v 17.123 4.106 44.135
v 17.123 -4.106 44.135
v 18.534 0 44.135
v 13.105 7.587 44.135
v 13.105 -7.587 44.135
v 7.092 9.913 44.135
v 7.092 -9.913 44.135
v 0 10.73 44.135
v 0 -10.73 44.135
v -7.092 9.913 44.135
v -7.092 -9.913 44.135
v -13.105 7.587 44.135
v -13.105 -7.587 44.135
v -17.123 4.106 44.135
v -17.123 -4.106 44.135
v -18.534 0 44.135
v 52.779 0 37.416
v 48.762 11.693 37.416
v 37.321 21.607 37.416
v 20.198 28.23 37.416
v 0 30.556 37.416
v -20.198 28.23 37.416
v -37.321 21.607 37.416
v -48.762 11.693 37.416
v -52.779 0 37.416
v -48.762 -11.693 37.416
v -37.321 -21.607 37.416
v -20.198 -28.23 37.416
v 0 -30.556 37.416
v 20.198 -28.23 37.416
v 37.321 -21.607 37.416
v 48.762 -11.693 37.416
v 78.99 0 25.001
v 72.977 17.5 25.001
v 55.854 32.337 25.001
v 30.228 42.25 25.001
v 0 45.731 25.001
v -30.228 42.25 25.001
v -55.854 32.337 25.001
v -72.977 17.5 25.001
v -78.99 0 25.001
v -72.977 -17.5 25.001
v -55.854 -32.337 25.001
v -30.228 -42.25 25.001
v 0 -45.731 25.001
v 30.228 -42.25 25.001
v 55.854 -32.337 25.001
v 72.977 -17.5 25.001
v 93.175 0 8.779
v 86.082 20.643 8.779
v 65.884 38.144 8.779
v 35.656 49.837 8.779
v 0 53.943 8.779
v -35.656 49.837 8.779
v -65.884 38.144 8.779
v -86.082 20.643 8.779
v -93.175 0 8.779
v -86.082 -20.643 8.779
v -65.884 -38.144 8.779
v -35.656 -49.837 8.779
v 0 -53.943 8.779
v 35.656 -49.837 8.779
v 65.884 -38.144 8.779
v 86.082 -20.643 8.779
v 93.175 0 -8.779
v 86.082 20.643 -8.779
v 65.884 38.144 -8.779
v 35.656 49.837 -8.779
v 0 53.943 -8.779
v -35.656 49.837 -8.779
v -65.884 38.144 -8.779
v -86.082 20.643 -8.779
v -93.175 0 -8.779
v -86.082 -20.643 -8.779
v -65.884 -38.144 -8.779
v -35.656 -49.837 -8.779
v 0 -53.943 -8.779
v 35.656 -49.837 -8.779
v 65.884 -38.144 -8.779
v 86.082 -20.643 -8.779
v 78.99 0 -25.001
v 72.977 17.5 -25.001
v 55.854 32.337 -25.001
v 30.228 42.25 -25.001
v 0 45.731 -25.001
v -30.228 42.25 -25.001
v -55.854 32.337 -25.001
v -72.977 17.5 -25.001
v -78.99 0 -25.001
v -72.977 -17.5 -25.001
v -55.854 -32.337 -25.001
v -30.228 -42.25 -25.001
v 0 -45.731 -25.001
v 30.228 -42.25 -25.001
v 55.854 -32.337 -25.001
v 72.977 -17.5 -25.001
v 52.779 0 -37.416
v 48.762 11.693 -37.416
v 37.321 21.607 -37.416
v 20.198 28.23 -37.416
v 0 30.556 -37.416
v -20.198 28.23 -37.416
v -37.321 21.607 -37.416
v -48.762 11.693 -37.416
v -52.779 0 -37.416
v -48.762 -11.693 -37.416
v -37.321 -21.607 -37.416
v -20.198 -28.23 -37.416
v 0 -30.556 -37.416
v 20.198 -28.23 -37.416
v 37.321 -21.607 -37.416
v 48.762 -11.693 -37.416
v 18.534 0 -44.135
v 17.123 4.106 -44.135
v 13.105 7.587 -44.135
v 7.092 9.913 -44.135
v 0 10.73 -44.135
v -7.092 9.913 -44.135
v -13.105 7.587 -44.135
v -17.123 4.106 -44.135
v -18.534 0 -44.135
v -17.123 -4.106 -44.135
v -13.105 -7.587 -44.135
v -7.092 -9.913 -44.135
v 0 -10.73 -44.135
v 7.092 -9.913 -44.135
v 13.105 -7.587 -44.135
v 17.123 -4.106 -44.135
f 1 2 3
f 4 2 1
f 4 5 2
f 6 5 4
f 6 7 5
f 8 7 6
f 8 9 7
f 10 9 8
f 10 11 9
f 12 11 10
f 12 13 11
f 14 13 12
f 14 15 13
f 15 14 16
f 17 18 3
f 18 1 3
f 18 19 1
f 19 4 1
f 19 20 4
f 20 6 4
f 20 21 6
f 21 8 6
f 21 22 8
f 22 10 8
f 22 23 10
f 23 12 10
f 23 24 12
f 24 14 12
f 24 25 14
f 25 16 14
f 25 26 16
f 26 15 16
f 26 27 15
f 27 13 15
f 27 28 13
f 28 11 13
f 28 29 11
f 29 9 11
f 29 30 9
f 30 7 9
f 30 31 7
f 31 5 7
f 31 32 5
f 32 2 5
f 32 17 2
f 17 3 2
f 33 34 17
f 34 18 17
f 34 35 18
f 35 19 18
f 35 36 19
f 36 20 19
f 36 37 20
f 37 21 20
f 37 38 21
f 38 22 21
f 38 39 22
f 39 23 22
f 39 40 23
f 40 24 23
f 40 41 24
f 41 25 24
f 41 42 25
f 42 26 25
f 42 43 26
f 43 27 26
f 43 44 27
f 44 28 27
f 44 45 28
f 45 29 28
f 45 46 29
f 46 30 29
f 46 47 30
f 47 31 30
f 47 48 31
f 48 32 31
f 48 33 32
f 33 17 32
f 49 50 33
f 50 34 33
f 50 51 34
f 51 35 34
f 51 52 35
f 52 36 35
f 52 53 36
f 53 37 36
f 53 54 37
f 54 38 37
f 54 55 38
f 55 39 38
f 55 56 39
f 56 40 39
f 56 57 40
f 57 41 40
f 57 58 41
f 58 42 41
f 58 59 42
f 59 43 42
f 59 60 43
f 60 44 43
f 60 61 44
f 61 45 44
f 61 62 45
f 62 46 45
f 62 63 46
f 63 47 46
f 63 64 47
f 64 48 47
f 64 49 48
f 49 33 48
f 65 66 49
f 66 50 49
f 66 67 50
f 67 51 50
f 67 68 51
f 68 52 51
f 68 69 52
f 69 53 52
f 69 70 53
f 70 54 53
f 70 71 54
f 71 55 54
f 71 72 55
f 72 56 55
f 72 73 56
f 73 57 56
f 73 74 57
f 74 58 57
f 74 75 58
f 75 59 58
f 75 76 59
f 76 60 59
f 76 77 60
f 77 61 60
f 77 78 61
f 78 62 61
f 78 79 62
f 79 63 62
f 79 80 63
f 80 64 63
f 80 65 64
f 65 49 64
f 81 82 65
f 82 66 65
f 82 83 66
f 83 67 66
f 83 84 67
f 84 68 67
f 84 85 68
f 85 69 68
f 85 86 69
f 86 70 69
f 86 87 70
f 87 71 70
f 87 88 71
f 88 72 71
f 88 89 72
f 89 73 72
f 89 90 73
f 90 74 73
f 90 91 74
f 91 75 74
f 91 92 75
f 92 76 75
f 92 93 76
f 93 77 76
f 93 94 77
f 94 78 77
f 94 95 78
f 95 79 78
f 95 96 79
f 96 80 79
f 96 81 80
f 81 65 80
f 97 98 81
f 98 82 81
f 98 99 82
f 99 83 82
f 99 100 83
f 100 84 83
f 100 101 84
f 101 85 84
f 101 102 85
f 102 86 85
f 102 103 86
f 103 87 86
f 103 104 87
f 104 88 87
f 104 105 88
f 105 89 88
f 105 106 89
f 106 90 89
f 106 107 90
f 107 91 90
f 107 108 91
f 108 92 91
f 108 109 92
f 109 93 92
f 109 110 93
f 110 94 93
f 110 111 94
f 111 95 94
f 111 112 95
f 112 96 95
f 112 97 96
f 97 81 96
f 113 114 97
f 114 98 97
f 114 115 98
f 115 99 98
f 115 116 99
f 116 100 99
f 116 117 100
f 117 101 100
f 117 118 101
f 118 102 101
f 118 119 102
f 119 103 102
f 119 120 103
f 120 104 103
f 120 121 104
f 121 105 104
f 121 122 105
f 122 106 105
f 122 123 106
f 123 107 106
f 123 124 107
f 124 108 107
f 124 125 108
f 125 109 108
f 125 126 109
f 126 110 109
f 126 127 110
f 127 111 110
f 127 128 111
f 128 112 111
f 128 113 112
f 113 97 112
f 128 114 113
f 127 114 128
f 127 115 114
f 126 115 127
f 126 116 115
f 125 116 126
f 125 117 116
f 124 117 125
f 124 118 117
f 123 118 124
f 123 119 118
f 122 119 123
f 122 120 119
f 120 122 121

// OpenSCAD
// Generated by SolidPython 1.0.1 on 2020-07-29 00:46:54


scale(v = [19, 11, 9]) {
	sphere(r = 5);
}
/***********************************************
*********      SolidPython code:      **********
************************************************
 
# import packages: SolidPython
from solid import *
from solid.utils import *
from itertools import chain, combinations, permutations


class Resize:

    def __init__(self, scad_file):
        self.scad_file = scad_file
        #self.scad_file = import_scad(scad_file)
        # cone/cylinder param:
        self.r1 = 0
        self.r2 = 0
        self.h = 0
        # rectangular prism param:
        self.w = 0
        self.l = 0
        # ellipse param:
        self.r = 0

    # import OpenScad code (file name corresponds to shape)


    # classify shape + parameters
    def assign(self, param1, param2, param3):
        if self.scad_file == 'cone.scad':
            self.r1 = param1
            self.r2 = param2
            self.h = param3
        elif self.scad_file == 'cylinder.scad':
            self.r1 = param1
            self.r2 = param2
            self.h = param3
        elif self.scad_file == 'rectangularPrism.scad':
            self.h = param1
            self.l = param2
            self.w = param3
        else:
            self.r = param1
            self.h = param2

    # resize parameters
    def iterate(self):
        x = range(3, 20, 2)
        i = 1
        if self.scad_file == 'cone.scad':
            tempList = list(permutations(x, 2))
            for temp in tempList:
                param1 = temp[0]
                param2 = temp[1]
                filepath = 'produced_scad_files/' + 'cone' + str(param1) + '_' + str(param2) + '_' + '.scad'
                scad_render_to_file(cylinder(h=param1, r1=param2, r2=0), filepath)

        elif self.scad_file == 'cylinder.scad':
            tempList = list(permutations(x, 3))
            for temp in tempList:
                param1 = temp[0]
                param2 = temp[1]
                filepath = 'produced_scad_files/' + 'cylinder' + str(param1) + '_' + str(param2) + '_' + '.scad'
                scad_render_to_file(cylinder(h=param1, r1=param2, r2=param2), filepath)

        elif self.scad_file == 'rectangularPrism.scad':
            tempList = list(permutations(x, 3))
            for temp in tempList:
                param1 = temp[0]
                param2 = temp[1]
                param3 = temp[2]
                filepath = 'produced_scad_files/' + 'rectangularPrism' + str(param1) + '_' + str(param2) + '_' + str(
                    param3) + '.scad'
                scad_render_to_file(cube(size=(param1, param2, param3)), filepath)

        elif self.scad_file == 'ellipse.scad':
            tempList = list(permutations(x, 4))
            for temp in tempList:
                param1 = temp[0]
                param2 = temp[1]
                param3 = temp[2]
                param4 = temp[3]
                filepath = 'produced_scad_files/' + 'ellipse' + str(param1) + '_' + str(param2) + '_' + str(param3) + '_' + str(param4) + '.scad'
                scad_render_to_file(scale([param1, param2, param3])(sphere(r=param4)), filepath)

    def render_to_scadfile(self):
        scad_render_to_file(scad, 'example.scad') 
 
************************************************/
